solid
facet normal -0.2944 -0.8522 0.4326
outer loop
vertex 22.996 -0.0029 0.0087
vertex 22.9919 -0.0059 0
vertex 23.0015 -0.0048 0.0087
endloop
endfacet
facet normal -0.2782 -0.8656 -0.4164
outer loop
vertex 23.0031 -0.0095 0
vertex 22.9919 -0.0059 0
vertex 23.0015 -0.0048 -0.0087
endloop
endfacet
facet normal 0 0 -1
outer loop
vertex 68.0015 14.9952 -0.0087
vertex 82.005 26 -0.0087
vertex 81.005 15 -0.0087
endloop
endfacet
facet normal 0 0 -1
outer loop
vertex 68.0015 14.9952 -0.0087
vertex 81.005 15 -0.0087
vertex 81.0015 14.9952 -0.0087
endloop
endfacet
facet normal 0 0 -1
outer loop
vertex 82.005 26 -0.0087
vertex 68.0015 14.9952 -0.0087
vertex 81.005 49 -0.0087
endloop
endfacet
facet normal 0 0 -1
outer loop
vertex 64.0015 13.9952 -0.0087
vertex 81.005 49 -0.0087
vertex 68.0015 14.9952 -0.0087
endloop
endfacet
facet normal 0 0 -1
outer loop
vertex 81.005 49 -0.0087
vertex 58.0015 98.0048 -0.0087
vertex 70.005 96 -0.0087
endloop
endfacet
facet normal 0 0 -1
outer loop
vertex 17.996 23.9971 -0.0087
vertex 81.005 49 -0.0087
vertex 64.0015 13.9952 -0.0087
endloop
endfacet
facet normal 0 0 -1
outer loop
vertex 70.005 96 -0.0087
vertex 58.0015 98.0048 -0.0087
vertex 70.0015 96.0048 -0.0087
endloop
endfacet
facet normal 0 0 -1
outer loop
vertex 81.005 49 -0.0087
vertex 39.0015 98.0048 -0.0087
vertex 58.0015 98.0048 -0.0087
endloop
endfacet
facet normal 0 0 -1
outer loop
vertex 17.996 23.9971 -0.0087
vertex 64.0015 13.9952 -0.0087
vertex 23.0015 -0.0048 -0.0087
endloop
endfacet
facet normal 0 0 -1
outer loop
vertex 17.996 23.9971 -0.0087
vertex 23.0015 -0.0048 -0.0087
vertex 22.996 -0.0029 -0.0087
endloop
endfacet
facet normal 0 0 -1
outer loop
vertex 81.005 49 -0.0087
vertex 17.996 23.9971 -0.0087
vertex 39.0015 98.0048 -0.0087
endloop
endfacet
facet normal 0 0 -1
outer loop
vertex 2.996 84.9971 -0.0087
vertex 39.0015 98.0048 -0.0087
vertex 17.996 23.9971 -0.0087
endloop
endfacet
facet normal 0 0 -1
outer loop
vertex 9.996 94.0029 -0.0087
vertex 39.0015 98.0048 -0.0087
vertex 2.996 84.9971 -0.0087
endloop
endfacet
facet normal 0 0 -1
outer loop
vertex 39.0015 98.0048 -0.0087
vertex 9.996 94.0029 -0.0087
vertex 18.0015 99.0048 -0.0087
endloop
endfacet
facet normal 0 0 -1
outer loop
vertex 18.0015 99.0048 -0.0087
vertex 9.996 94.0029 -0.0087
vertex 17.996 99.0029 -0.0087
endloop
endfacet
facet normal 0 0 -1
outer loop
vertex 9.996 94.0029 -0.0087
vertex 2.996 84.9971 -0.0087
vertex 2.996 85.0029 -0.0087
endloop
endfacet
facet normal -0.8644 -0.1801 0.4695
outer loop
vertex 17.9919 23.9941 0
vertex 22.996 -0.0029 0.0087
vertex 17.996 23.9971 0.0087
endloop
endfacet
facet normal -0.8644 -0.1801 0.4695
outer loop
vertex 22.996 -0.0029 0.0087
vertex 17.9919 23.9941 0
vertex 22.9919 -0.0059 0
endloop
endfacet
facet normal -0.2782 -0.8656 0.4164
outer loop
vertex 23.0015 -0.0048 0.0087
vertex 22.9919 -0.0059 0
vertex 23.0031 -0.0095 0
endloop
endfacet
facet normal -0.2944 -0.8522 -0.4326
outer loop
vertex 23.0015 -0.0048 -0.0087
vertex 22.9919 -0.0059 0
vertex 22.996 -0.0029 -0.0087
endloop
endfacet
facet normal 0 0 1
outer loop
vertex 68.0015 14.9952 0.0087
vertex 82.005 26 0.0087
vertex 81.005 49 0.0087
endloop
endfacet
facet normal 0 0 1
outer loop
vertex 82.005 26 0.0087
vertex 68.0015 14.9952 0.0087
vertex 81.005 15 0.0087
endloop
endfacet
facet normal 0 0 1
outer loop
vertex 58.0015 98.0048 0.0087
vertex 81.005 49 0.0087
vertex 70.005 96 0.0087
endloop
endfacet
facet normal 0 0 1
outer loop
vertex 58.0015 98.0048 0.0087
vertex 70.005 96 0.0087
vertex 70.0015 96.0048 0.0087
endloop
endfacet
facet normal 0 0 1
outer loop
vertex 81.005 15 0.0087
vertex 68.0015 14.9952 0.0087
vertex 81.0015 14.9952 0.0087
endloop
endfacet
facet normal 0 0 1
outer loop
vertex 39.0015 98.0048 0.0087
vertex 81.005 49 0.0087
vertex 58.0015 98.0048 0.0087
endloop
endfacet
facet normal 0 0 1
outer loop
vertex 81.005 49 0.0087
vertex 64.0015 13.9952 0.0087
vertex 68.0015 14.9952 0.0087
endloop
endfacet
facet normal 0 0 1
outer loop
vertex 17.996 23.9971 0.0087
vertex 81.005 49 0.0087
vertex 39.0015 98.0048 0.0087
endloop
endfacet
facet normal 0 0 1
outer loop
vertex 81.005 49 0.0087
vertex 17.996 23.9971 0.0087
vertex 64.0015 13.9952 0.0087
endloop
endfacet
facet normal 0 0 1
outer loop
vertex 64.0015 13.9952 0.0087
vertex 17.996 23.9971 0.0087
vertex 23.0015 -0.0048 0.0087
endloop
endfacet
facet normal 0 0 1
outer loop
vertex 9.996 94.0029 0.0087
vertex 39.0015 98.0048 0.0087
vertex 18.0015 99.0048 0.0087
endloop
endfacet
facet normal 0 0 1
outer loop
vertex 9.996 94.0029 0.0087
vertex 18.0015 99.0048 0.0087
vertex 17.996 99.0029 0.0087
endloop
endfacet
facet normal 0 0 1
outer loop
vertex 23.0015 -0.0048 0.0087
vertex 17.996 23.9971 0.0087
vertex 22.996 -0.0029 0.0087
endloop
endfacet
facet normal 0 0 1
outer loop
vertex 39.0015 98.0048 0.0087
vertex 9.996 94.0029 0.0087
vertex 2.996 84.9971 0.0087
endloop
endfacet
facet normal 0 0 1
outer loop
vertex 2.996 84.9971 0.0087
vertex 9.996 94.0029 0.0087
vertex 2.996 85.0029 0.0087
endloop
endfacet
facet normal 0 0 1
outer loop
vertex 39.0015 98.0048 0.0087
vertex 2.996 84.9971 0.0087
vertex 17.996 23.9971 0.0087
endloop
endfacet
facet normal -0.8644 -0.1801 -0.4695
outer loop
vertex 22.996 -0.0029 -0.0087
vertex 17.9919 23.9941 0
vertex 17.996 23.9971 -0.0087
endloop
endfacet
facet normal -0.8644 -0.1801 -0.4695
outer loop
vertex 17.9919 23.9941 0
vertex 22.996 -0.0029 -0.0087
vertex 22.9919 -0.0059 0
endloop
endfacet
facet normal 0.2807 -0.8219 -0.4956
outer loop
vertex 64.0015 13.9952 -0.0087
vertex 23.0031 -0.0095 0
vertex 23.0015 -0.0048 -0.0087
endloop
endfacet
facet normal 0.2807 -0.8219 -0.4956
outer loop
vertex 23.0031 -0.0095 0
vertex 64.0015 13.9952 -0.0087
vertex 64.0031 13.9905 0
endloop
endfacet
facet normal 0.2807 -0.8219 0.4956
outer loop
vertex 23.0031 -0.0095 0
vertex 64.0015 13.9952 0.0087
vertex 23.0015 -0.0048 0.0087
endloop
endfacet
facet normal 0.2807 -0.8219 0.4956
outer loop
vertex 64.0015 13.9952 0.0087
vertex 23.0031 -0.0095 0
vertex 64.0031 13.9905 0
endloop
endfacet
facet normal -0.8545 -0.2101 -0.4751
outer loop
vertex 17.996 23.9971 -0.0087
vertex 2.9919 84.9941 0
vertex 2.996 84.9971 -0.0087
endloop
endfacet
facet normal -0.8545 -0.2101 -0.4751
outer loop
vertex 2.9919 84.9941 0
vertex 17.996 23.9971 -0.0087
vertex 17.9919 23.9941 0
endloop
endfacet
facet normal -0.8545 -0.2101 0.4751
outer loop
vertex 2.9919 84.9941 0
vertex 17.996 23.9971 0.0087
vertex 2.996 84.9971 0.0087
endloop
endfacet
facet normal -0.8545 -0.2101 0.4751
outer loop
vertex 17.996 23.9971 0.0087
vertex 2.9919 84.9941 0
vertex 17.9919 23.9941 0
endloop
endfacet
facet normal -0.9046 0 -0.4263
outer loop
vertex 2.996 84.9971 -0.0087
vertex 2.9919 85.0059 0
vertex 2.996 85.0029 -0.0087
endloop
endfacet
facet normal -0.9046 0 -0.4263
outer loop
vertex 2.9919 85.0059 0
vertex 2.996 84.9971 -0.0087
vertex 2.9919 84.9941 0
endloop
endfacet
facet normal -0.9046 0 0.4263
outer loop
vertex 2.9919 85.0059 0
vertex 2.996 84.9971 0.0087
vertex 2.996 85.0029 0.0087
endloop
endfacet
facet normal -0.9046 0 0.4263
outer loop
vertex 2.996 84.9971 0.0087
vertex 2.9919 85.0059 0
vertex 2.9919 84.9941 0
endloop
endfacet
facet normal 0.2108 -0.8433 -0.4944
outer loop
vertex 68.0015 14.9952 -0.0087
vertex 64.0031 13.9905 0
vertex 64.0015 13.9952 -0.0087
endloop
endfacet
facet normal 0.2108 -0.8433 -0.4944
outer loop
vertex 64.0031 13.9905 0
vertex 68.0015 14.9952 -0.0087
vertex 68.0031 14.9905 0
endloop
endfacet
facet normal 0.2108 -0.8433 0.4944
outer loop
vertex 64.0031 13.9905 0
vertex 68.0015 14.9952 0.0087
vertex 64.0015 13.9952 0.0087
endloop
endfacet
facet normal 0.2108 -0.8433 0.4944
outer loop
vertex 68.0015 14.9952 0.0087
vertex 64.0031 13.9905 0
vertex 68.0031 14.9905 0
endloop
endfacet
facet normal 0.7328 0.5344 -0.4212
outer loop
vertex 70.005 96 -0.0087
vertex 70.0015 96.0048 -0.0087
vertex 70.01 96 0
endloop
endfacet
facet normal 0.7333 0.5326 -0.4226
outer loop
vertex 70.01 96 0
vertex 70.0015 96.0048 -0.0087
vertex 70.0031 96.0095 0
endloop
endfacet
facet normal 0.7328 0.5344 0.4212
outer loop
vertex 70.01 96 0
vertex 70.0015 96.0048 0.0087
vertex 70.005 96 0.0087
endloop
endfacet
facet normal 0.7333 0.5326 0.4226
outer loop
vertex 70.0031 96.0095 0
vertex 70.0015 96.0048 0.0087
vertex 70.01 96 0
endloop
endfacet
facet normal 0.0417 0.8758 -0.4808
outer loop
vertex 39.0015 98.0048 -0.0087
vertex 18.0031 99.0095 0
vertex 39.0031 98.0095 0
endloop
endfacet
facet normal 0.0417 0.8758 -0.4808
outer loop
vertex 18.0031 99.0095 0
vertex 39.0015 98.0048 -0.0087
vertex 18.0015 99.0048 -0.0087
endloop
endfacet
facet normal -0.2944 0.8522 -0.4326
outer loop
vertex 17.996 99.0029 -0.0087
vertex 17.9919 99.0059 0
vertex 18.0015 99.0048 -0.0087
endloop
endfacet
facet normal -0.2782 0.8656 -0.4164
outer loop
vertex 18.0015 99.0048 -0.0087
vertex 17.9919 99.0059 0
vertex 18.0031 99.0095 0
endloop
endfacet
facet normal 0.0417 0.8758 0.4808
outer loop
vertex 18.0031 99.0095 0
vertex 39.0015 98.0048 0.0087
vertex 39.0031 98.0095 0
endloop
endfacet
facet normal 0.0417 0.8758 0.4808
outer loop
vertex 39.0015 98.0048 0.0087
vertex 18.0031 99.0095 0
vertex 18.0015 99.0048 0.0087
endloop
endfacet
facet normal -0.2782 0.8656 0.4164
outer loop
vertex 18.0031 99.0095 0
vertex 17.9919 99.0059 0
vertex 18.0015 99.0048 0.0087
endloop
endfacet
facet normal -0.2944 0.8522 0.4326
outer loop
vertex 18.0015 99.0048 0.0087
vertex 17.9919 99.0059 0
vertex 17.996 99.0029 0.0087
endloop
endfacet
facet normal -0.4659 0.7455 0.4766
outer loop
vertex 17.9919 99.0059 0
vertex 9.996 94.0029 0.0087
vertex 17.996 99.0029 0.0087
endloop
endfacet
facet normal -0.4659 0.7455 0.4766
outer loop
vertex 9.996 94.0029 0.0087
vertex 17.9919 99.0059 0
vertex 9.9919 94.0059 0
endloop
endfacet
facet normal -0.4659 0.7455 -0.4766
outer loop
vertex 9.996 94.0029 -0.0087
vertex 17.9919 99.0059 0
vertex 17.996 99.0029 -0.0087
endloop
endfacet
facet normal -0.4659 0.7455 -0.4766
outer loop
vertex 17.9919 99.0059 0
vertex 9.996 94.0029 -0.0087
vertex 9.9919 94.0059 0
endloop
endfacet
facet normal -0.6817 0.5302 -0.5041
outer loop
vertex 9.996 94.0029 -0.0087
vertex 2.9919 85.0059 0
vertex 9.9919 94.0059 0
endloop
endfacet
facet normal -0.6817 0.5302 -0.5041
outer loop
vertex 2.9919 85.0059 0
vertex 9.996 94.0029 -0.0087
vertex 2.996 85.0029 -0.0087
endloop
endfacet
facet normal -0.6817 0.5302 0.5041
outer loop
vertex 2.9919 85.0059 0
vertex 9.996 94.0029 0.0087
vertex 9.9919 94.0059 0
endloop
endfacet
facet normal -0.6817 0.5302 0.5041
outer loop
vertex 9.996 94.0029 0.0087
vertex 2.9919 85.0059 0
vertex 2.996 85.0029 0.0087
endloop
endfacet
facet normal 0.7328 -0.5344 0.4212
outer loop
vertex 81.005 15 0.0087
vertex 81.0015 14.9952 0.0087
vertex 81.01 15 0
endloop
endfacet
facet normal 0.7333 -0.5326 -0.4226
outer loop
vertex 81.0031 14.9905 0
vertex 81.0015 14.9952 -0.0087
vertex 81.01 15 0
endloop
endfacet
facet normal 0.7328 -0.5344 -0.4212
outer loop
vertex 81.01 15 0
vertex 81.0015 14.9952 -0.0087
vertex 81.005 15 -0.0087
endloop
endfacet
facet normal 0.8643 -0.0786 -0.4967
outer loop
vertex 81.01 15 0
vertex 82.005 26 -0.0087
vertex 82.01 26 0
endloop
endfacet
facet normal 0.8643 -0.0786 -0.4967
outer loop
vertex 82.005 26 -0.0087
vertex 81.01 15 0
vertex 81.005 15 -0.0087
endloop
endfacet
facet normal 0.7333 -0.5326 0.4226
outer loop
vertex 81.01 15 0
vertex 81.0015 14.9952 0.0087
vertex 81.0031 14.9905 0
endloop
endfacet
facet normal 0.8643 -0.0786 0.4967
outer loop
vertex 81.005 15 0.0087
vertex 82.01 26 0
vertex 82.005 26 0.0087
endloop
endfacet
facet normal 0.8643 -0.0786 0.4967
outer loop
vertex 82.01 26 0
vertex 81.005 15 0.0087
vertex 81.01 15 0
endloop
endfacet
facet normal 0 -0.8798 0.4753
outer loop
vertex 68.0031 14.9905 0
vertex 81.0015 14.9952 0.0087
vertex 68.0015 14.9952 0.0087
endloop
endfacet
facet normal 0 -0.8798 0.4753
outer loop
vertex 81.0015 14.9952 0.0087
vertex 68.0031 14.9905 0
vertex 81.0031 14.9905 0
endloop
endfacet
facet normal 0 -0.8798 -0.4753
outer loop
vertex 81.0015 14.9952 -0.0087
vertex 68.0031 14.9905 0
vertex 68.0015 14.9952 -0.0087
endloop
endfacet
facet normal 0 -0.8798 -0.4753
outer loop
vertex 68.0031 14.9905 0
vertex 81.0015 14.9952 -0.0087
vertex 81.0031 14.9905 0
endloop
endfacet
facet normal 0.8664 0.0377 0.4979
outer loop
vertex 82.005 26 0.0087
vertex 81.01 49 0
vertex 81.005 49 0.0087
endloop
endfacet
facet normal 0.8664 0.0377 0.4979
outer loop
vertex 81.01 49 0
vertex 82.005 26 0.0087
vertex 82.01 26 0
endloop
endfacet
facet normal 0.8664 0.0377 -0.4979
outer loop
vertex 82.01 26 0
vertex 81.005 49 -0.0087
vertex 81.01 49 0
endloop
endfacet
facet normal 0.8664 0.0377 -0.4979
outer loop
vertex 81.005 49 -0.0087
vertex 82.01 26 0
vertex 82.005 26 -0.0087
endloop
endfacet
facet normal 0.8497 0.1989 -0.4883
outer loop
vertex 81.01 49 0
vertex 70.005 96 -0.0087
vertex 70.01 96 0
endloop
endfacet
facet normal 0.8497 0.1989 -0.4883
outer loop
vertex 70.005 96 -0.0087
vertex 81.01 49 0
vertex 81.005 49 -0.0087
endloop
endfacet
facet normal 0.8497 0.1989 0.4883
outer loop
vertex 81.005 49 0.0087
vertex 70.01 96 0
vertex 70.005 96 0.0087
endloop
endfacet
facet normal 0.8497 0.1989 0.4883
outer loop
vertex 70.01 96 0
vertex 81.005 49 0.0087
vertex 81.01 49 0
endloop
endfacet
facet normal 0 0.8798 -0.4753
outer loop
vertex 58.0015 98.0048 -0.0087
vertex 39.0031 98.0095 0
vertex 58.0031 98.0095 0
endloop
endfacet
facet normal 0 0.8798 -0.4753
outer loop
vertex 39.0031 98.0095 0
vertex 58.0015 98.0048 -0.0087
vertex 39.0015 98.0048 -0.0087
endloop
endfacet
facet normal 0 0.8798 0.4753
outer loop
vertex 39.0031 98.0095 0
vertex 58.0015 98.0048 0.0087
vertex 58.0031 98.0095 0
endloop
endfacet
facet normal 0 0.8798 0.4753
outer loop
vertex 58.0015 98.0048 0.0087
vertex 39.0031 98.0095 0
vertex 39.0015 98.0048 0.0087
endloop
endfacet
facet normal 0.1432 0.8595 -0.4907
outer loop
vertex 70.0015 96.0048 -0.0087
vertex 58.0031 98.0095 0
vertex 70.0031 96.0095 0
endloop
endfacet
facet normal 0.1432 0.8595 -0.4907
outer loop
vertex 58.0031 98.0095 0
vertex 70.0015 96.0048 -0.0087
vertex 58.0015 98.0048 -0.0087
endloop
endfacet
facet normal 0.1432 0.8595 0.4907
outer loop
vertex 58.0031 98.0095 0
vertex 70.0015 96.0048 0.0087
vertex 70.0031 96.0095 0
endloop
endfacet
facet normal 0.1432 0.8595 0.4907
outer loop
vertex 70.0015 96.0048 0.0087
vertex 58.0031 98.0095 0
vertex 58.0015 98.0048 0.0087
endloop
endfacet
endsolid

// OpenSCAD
color([0.5839405385485582,0.4048698908705002,0.6877557316706271]) hull(){
    translate([23,0]) sphere(0.01);
    translate([18,24]) sphere(0.01);
    translate([24,21]) sphere(0.01);
}
color([0.29310936231965135,0.08456113000314536,0.6409271470126323]) hull(){
    translate([18,24]) sphere(0.01);
    translate([24,21]) sphere(0.01);
    translate([26,22]) sphere(0.01);
}
color([0.38512246522478266,0.6162859510128613,0.407224705538046]) hull(){
    translate([23,0]) sphere(0.01);
    translate([24,21]) sphere(0.01);
    translate([26,22]) sphere(0.01);
}
color([0.6107800780239486,0.9541913078580654,0.09369719926319908]) hull(){
    translate([23,0]) sphere(0.01);
    translate([26,22]) sphere(0.01);
    translate([42,29]) sphere(0.01);
}
color([0.4396226851829427,0.9817497074141792,0.30111933510979894]) hull(){
    translate([23,0]) sphere(0.01);
    translate([42,29]) sphere(0.01);
    translate([64,14]) sphere(0.01);
}
color([0.08571041628526821,0.691130580335744,0.16573157374072334]) hull(){
    translate([18,24]) sphere(0.01);
    translate([26,22]) sphere(0.01);
    translate([26,51]) sphere(0.01);
}
color([0.4668304924867862,0.30100213617539295,0.3511677492745029]) hull(){
    translate([18,24]) sphere(0.01);
    translate([26,51]) sphere(0.01);
    translate([18,58]) sphere(0.01);
}
color([0.05564944269037686,0.7696481469448815,0.686275624239137]) hull(){
    translate([18,58]) sphere(0.01);
    translate([18,24]) sphere(0.01);
    translate([3,85]) sphere(0.01);
}
color([0.15447252119296884,0.35335085758162643,0.18799175914388588]) hull(){
    translate([18,58]) sphere(0.01);
    translate([3,85]) sphere(0.01);
    translate([16,79]) sphere(0.01);
}
color([0.41322879780265653,0.82270842281296,0.9057146612667819]) hull(){
    translate([26,22]) sphere(0.01);
    translate([26,51]) sphere(0.01);
    translate([35,48]) sphere(0.01);
}
color([0.9688547633127277,0.5528378273263655,0.12760284187612392]) hull(){
    translate([26,22]) sphere(0.01);
    translate([35,48]) sphere(0.01);
    translate([42,29]) sphere(0.01);
}
color([0.1710979555253146,0.7131998843266452,0.6397779425125977]) hull(){
    translate([42,29]) sphere(0.01);
    translate([35,48]) sphere(0.01);
    translate([44,47]) sphere(0.01);
}
color([0.57496968906483,0.8489371230716904,0.07944838941339594]) hull(){
    translate([42,29]) sphere(0.01);
    translate([44,47]) sphere(0.01);
    translate([58,33]) sphere(0.01);
}
color([0.040333123224873146,0.9305910632054132,0.3080440975445232]) hull(){
    translate([42,29]) sphere(0.01);
    translate([58,33]) sphere(0.01);
    translate([64,14]) sphere(0.01);
}
color([0.6084655882345898,0.4923441190446234,0.7069385087242315]) hull(){
    translate([64,14]) sphere(0.01);
    translate([58,33]) sphere(0.01);
    translate([68,15]) sphere(0.01);
}
color([0.6803385961846494,0.18024793645131376,0.10787678186317007]) hull(){
    translate([68,15]) sphere(0.01);
    translate([58,33]) sphere(0.01);
    translate([72,20]) sphere(0.01);
}
color([0.1335624130282893,0.47731112778056706,0.8393950916733898]) hull(){
    translate([72,20]) sphere(0.01);
    translate([58,33]) sphere(0.01);
    translate([82,26]) sphere(0.01);
}
color([0.6780893207968227,0.08337096158279222,0.27725115680544954]) hull(){
    translate([82,26]) sphere(0.01);
    translate([58,33]) sphere(0.01);
    translate([77,50]) sphere(0.01);
}
color([0.9965791662073833,0.03375154870506614,0.10494976972159242]) hull(){
    translate([44,47]) sphere(0.01);
    translate([58,33]) sphere(0.01);
    translate([44,55]) sphere(0.01);
}
color([0.516844917539197,0.1360610465034362,0.543805910213663]) hull(){
    translate([44,55]) sphere(0.01);
    translate([58,33]) sphere(0.01);
    translate([77,50]) sphere(0.01);
}
color([0.04901628196141694,0.4867102513994055,0.8813892002857401]) hull(){
    translate([44,47]) sphere(0.01);
    translate([44,55]) sphere(0.01);
    translate([35,48]) sphere(0.01);
}
color([0.3053751014353143,0.40772022041766365,0.31297204198076634]) hull(){
    translate([35,48]) sphere(0.01);
    translate([44,55]) sphere(0.01);
    translate([30,57]) sphere(0.01);
}
color([0.49907796034366436,0.6160709555012981,0.9916538905911245]) hull(){
    translate([35,48]) sphere(0.01);
    translate([30,57]) sphere(0.01);
    translate([26,51]) sphere(0.01);
}
color([0.3123575451593331,0.46364206475662195,0.8862899719975306]) hull(){
    translate([26,51]) sphere(0.01);
    translate([30,57]) sphere(0.01);
    translate([18,58]) sphere(0.01);
}
color([0.5738800220993816,0.8494037217359881,0.24323676398212035]) hull(){
    translate([30,57]) sphere(0.01);
    translate([18,58]) sphere(0.01);
    translate([16,79]) sphere(0.01);
}
color([0.8402878098664139,0.9530478541805099,0.16594803365564914]) hull(){
    translate([30,57]) sphere(0.01);
    translate([16,79]) sphere(0.01);
    translate([22,90]) sphere(0.01);
}
color([0.0023370868964924796,0.7387895340607371,0.5374530602666081]) hull(){
    translate([30,57]) sphere(0.01);
    translate([22,90]) sphere(0.01);
    translate([44,55]) sphere(0.01);
}
color([0.25604025835089217,0.4320068924153808,0.5112453323210508]) hull(){
    translate([44,55]) sphere(0.01);
    translate([22,90]) sphere(0.01);
    translate([59,71]) sphere(0.01);
}
color([0.7462272619347637,0.5039790716190428,0.8850839351693509]) hull(){
    translate([44,55]) sphere(0.01);
    translate([59,71]) sphere(0.01);
    translate([77,50]) sphere(0.01);
}
color([0.6652757233710683,0.22263754843686523,0.08942086350367451]) hull(){
    translate([77,50]) sphere(0.01);
    translate([59,71]) sphere(0.01);
    translate([80,52]) sphere(0.01);
}
color([0.6195232841458308,0.9036720387350747,0.7222923954673625]) hull(){
    translate([80,52]) sphere(0.01);
    translate([59,71]) sphere(0.01);
    translate([70,96]) sphere(0.01);
}
color([0.6665075097113882,0.5421139713900744,0.6943978877819516]) hull(){
    translate([59,71]) sphere(0.01);
    translate([70,96]) sphere(0.01);
    translate([50,93]) sphere(0.01);
}
color([0.9269770591996176,0.12480324665016229,0.8422397758241813]) hull(){
    translate([59,71]) sphere(0.01);
    translate([50,93]) sphere(0.01);
    translate([22,90]) sphere(0.01);
}
color([0.028249143050612435,0.8554899328562455,0.6212809598996976]) hull(){
    translate([22,90]) sphere(0.01);
    translate([50,93]) sphere(0.01);
    translate([39,98]) sphere(0.01);
}
color([0.6435486749275994,0.4857227915978113,0.2898251547629681]) hull(){
    translate([22,90]) sphere(0.01);
    translate([39,98]) sphere(0.01);
    translate([18,99]) sphere(0.01);
}
color([0.21709076393122206,0.4979948584580751,0.6176241526046676]) hull(){
    translate([22,90]) sphere(0.01);
    translate([18,99]) sphere(0.01);
    translate([10,94]) sphere(0.01);
}
color([0.4722249532281336,0.7228331534363125,0.6109414561657331]) hull(){
    translate([22,90]) sphere(0.01);
    translate([10,94]) sphere(0.01);
    translate([20,83]) sphere(0.01);
}
color([0.5330085163671737,0.6769359871291822,0.5973748769978083]) hull(){
    translate([20,83]) sphere(0.01);
    translate([10,94]) sphere(0.01);
    translate([6,84]) sphere(0.01);
}
color([0.14460255854654236,0.21273280877313017,0.8417179364881341]) hull(){
    translate([20,83]) sphere(0.01);
    translate([6,84]) sphere(0.01);
    translate([16,79]) sphere(0.01);
}
color([0.6300391880279899,0.5103677782275869,0.4479627161837708]) hull(){
    translate([16,79]) sphere(0.01);
    translate([6,84]) sphere(0.01);
    translate([3,85]) sphere(0.01);
}
color([0.2903518628620462,0.1744676713524972,0.5457372127765215]) hull(){
    translate([3,85]) sphere(0.01);
    translate([6,84]) sphere(0.01);
    translate([10,94]) sphere(0.01);
}
color([0.6340658375422632,0.7004271366493812,0.690956934786038]) hull(){
    translate([20,83]) sphere(0.01);
    translate([16,79]) sphere(0.01);
    translate([22,90]) sphere(0.01);
}
color([0.013948469234104865,0.8018456354370093,0.2607079205191076]) hull(){
    translate([72,20]) sphere(0.01);
    translate([82,26]) sphere(0.01);
    translate([81,15]) sphere(0.01);
}
color([0.01899716010339858,0.7507132946374245,0.44168653561511173]) hull(){
    translate([68,15]) sphere(0.01);
    translate([72,20]) sphere(0.01);
    translate([81,15]) sphere(0.01);
}
color([0.1668653701245908,0.45955837321901094,0.7876756969907556]) hull(){
    translate([82,26]) sphere(0.01);
    translate([77,50]) sphere(0.01);
    translate([81,49]) sphere(0.01);
}
color([0.09564527702692727,0.06733136152719421,0.7816649665975636]) hull(){
    translate([81,49]) sphere(0.01);
    translate([77,50]) sphere(0.01);
    translate([80,52]) sphere(0.01);
}
color([0.030385075649315252,0.33346286891595733,0.08647112242809318]) hull(){
    translate([81,49]) sphere(0.01);
    translate([80,52]) sphere(0.01);
    translate([70,96]) sphere(0.01);
}
color([0.8161439782233904,0.05657658467482607,0.8243668117903717]) hull(){
    translate([82,26]) sphere(0.01);
    translate([81,49]) sphere(0.01);
    translate([81,15]) sphere(0.01);
}
color([0.05808931884644186,0.6181904095369413,0.1426995958976538]) hull(){
    translate([39,98]) sphere(0.01);
    translate([50,93]) sphere(0.01);
    translate([58,98]) sphere(0.01);
}
color([0.3846464495954227,0.3794414211645075,0.7643773332264734]) hull(){
    translate([58,98]) sphere(0.01);
    translate([50,93]) sphere(0.01);
    translate([70,96]) sphere(0.01);
}
